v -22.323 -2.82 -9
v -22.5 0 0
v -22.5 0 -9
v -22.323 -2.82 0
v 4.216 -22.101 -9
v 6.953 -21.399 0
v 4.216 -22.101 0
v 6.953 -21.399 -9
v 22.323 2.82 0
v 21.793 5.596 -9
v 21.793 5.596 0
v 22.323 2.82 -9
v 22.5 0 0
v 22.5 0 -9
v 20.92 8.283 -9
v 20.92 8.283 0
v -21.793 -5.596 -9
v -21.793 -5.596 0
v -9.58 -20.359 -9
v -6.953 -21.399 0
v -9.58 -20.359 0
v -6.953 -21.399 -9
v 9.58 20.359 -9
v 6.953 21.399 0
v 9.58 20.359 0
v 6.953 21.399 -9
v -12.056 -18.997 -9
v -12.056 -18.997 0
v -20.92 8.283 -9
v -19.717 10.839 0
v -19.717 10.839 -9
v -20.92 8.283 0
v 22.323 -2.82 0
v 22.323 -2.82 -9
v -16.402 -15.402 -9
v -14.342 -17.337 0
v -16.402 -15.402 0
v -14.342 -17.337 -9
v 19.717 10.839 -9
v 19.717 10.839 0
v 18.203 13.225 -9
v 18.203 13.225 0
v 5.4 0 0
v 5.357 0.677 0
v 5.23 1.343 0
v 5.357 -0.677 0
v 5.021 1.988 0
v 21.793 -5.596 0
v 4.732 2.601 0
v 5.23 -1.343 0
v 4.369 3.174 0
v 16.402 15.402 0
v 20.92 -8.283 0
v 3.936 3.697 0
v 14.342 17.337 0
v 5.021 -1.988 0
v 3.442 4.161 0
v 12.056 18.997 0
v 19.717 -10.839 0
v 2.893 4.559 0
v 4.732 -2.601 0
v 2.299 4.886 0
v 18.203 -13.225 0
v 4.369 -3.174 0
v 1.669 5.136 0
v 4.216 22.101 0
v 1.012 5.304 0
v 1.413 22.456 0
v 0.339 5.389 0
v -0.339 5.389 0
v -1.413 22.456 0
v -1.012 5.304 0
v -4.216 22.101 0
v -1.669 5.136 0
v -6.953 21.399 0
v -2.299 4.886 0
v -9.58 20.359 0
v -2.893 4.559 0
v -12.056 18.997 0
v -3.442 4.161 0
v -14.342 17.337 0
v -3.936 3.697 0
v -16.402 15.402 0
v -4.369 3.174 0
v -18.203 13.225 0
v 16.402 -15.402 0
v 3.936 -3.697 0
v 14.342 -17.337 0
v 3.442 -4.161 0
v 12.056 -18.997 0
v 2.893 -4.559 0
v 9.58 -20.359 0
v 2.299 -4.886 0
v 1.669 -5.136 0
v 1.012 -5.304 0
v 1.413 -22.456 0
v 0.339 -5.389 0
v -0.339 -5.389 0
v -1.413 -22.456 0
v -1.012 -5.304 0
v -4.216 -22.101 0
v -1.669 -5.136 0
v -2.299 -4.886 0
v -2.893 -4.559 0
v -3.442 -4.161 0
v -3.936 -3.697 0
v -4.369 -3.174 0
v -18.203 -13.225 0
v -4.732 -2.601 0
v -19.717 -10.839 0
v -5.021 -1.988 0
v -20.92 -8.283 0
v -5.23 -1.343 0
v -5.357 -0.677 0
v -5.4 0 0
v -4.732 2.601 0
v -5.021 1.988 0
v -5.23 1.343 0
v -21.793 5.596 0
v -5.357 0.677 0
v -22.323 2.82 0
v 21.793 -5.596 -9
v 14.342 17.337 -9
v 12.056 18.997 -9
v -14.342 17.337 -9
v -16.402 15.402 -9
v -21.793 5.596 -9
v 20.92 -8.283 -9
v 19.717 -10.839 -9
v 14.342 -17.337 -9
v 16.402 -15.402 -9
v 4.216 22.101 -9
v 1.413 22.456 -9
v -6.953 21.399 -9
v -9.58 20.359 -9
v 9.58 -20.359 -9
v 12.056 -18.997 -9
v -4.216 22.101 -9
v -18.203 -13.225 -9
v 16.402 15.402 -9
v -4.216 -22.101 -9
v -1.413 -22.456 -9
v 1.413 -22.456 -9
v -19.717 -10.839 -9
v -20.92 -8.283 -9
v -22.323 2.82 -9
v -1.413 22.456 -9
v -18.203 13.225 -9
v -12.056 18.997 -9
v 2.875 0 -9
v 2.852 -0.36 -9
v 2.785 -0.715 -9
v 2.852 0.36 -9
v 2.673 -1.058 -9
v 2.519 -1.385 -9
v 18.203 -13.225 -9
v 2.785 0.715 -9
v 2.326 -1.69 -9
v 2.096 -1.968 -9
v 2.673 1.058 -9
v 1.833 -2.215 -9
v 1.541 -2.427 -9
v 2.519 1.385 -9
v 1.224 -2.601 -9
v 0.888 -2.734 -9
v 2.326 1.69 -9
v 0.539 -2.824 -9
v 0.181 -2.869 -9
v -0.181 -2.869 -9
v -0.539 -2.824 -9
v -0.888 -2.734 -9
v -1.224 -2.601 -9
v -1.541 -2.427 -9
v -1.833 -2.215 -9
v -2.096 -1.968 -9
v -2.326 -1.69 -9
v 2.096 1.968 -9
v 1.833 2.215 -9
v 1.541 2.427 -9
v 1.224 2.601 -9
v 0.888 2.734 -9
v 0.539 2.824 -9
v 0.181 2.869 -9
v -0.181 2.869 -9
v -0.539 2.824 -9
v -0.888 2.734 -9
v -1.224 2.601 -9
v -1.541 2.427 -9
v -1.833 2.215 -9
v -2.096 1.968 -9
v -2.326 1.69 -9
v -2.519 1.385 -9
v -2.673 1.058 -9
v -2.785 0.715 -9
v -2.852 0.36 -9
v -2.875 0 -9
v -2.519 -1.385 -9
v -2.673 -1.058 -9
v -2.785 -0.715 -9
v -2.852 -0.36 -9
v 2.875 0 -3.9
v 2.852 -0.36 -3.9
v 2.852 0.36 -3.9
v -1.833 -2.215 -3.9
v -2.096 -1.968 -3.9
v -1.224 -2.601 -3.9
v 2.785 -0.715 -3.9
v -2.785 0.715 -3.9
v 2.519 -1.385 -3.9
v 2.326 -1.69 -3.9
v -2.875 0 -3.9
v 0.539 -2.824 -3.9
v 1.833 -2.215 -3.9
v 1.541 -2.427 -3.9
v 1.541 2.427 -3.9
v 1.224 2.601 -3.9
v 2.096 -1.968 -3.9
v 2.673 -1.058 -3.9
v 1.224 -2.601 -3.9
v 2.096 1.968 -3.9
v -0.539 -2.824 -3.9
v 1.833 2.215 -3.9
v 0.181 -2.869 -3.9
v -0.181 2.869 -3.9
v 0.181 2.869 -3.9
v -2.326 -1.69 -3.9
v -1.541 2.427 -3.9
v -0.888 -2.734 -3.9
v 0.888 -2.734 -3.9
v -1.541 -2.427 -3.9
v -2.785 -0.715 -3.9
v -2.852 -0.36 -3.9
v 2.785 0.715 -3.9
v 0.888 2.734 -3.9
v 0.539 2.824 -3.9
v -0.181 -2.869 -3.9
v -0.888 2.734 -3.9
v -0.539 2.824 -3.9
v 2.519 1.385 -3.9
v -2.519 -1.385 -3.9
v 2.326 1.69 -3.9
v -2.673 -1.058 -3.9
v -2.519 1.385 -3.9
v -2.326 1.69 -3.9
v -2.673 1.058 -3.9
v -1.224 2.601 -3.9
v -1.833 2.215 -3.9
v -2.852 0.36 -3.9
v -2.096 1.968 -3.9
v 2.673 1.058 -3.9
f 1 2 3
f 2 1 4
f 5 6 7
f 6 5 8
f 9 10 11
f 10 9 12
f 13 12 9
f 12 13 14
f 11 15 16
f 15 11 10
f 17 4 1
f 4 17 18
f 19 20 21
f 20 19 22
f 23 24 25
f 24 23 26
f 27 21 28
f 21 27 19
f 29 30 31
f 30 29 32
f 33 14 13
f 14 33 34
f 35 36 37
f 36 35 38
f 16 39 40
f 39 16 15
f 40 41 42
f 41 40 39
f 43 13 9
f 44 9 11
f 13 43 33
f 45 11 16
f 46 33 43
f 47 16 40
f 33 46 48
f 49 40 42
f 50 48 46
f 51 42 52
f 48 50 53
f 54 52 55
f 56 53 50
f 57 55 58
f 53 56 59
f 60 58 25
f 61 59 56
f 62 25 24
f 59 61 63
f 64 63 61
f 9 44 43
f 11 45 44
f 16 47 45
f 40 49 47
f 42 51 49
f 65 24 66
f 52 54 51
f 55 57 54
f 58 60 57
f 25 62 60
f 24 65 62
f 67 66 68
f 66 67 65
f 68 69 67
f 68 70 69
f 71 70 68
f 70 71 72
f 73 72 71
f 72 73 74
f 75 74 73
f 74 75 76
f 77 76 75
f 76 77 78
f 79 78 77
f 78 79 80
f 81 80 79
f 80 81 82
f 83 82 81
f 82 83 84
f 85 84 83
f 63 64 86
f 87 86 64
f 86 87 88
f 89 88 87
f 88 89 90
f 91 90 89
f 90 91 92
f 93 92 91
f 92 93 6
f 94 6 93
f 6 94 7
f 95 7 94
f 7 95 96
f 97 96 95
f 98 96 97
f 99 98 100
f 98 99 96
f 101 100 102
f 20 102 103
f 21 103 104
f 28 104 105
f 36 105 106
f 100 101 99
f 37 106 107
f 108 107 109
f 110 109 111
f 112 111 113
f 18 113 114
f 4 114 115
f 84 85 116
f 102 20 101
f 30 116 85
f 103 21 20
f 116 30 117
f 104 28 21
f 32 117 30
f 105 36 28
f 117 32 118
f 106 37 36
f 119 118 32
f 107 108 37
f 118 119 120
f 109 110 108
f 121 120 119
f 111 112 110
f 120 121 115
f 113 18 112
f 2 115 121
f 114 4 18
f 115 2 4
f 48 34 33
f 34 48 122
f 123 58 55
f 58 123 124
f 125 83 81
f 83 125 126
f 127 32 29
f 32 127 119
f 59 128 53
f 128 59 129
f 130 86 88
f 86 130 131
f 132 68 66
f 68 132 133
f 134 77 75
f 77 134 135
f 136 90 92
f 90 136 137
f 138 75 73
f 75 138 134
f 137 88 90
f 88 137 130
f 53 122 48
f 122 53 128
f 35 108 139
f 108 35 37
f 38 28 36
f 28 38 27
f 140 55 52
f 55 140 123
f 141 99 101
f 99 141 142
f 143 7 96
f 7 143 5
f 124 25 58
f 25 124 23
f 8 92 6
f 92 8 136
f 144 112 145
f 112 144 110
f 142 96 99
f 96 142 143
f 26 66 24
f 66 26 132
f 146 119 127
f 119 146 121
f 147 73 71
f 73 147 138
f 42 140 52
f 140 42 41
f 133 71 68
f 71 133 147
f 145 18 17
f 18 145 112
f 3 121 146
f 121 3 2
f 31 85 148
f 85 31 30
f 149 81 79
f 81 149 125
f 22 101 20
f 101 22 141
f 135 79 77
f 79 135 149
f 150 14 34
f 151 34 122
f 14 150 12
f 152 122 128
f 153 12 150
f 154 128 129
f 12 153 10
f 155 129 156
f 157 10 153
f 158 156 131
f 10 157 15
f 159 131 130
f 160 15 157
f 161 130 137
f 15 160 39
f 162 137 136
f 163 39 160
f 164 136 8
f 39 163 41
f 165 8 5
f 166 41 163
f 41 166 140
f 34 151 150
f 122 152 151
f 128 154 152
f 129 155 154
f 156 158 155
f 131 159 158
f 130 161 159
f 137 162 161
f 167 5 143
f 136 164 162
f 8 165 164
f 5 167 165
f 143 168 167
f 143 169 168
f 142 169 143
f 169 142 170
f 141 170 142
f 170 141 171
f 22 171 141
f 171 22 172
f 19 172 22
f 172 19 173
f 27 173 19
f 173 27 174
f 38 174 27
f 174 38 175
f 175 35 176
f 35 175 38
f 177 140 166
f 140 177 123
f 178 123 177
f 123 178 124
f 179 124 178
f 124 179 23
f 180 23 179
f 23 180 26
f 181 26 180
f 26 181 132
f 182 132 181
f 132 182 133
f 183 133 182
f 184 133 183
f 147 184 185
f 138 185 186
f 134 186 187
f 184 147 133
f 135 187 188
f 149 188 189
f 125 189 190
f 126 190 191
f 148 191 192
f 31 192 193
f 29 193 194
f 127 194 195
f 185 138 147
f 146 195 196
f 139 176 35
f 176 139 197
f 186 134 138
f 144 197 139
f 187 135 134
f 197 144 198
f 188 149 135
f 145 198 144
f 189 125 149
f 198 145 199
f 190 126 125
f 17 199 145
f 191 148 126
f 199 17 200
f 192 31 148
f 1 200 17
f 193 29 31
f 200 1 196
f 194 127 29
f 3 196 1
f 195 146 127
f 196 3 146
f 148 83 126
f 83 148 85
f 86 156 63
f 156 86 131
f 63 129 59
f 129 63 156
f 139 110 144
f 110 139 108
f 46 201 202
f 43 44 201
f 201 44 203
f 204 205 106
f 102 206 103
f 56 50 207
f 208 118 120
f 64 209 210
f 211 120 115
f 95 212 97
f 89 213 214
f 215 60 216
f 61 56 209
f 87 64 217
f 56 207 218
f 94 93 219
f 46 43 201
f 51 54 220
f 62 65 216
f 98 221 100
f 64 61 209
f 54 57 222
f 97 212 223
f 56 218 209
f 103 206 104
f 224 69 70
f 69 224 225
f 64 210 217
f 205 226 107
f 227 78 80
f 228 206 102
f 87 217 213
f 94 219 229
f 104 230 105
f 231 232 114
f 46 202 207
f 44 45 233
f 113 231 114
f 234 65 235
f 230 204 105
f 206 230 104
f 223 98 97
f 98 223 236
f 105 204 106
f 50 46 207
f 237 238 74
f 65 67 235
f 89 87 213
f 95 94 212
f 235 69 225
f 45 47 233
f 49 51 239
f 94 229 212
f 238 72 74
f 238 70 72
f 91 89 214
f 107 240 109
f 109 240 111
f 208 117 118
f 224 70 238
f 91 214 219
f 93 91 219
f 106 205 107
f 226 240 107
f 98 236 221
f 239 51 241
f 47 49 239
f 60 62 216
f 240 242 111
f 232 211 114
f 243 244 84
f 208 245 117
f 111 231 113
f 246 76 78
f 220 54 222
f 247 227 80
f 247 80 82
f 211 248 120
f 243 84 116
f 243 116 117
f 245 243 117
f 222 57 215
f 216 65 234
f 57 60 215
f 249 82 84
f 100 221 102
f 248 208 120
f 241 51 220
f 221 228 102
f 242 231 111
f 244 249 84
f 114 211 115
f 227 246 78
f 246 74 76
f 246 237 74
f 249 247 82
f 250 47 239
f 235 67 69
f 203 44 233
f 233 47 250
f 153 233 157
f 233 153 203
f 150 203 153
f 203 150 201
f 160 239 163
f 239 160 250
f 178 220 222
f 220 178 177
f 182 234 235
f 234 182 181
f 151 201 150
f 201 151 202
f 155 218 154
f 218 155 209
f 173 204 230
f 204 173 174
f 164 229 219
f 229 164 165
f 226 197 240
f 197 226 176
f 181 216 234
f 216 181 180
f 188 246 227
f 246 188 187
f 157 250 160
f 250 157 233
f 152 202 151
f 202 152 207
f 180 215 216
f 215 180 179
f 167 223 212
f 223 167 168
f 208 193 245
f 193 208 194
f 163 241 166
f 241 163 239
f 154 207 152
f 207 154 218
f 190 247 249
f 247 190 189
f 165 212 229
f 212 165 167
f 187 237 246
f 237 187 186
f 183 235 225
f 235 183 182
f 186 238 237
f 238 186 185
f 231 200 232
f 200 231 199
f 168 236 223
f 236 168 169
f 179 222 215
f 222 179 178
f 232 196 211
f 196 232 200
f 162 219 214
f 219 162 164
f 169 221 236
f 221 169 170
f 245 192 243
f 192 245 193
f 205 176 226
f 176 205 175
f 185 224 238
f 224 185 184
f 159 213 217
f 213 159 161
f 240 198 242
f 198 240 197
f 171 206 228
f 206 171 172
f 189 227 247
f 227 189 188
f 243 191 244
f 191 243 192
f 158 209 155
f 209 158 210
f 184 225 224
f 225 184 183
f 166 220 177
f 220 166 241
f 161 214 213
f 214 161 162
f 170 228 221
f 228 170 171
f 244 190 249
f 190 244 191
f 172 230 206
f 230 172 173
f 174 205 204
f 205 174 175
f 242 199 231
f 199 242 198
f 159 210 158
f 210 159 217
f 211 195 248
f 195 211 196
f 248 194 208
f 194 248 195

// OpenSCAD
$fn = 50;


difference() {
	union() {
		translate(v = [0, 0, -9.0000000000]) {
			cylinder(h = 9, r = 22.5000000000);
		}
		translate(v = [0, 0, -9.0000000000]) {
			cylinder(h = 9, r = 2.8750000000);
		}
	}
	union() {
		translate(v = [0, 0, 0]) {
			rotate(a = [0, 0, 0]) {
				difference() {
					union() {
						translate(v = [0, 0, -9.0000000000]) {
							cylinder(h = 9, r = 2.6000000000);
						}
						translate(v = [0, 0, -3.9000000000]) {
							cylinder(h = 3.9000000000, r1 = 2.8750000000, r2 = 5.4000000000);
						}
						translate(v = [0, 0, -9.0000000000]) {
							cylinder(h = 9, r = 2.8750000000);
						}
						translate(v = [0, 0, -9.0000000000]) {
							cylinder(h = 9, r = 2.6000000000);
						}
					}
					union();
				}
			}
		}
	}
}
